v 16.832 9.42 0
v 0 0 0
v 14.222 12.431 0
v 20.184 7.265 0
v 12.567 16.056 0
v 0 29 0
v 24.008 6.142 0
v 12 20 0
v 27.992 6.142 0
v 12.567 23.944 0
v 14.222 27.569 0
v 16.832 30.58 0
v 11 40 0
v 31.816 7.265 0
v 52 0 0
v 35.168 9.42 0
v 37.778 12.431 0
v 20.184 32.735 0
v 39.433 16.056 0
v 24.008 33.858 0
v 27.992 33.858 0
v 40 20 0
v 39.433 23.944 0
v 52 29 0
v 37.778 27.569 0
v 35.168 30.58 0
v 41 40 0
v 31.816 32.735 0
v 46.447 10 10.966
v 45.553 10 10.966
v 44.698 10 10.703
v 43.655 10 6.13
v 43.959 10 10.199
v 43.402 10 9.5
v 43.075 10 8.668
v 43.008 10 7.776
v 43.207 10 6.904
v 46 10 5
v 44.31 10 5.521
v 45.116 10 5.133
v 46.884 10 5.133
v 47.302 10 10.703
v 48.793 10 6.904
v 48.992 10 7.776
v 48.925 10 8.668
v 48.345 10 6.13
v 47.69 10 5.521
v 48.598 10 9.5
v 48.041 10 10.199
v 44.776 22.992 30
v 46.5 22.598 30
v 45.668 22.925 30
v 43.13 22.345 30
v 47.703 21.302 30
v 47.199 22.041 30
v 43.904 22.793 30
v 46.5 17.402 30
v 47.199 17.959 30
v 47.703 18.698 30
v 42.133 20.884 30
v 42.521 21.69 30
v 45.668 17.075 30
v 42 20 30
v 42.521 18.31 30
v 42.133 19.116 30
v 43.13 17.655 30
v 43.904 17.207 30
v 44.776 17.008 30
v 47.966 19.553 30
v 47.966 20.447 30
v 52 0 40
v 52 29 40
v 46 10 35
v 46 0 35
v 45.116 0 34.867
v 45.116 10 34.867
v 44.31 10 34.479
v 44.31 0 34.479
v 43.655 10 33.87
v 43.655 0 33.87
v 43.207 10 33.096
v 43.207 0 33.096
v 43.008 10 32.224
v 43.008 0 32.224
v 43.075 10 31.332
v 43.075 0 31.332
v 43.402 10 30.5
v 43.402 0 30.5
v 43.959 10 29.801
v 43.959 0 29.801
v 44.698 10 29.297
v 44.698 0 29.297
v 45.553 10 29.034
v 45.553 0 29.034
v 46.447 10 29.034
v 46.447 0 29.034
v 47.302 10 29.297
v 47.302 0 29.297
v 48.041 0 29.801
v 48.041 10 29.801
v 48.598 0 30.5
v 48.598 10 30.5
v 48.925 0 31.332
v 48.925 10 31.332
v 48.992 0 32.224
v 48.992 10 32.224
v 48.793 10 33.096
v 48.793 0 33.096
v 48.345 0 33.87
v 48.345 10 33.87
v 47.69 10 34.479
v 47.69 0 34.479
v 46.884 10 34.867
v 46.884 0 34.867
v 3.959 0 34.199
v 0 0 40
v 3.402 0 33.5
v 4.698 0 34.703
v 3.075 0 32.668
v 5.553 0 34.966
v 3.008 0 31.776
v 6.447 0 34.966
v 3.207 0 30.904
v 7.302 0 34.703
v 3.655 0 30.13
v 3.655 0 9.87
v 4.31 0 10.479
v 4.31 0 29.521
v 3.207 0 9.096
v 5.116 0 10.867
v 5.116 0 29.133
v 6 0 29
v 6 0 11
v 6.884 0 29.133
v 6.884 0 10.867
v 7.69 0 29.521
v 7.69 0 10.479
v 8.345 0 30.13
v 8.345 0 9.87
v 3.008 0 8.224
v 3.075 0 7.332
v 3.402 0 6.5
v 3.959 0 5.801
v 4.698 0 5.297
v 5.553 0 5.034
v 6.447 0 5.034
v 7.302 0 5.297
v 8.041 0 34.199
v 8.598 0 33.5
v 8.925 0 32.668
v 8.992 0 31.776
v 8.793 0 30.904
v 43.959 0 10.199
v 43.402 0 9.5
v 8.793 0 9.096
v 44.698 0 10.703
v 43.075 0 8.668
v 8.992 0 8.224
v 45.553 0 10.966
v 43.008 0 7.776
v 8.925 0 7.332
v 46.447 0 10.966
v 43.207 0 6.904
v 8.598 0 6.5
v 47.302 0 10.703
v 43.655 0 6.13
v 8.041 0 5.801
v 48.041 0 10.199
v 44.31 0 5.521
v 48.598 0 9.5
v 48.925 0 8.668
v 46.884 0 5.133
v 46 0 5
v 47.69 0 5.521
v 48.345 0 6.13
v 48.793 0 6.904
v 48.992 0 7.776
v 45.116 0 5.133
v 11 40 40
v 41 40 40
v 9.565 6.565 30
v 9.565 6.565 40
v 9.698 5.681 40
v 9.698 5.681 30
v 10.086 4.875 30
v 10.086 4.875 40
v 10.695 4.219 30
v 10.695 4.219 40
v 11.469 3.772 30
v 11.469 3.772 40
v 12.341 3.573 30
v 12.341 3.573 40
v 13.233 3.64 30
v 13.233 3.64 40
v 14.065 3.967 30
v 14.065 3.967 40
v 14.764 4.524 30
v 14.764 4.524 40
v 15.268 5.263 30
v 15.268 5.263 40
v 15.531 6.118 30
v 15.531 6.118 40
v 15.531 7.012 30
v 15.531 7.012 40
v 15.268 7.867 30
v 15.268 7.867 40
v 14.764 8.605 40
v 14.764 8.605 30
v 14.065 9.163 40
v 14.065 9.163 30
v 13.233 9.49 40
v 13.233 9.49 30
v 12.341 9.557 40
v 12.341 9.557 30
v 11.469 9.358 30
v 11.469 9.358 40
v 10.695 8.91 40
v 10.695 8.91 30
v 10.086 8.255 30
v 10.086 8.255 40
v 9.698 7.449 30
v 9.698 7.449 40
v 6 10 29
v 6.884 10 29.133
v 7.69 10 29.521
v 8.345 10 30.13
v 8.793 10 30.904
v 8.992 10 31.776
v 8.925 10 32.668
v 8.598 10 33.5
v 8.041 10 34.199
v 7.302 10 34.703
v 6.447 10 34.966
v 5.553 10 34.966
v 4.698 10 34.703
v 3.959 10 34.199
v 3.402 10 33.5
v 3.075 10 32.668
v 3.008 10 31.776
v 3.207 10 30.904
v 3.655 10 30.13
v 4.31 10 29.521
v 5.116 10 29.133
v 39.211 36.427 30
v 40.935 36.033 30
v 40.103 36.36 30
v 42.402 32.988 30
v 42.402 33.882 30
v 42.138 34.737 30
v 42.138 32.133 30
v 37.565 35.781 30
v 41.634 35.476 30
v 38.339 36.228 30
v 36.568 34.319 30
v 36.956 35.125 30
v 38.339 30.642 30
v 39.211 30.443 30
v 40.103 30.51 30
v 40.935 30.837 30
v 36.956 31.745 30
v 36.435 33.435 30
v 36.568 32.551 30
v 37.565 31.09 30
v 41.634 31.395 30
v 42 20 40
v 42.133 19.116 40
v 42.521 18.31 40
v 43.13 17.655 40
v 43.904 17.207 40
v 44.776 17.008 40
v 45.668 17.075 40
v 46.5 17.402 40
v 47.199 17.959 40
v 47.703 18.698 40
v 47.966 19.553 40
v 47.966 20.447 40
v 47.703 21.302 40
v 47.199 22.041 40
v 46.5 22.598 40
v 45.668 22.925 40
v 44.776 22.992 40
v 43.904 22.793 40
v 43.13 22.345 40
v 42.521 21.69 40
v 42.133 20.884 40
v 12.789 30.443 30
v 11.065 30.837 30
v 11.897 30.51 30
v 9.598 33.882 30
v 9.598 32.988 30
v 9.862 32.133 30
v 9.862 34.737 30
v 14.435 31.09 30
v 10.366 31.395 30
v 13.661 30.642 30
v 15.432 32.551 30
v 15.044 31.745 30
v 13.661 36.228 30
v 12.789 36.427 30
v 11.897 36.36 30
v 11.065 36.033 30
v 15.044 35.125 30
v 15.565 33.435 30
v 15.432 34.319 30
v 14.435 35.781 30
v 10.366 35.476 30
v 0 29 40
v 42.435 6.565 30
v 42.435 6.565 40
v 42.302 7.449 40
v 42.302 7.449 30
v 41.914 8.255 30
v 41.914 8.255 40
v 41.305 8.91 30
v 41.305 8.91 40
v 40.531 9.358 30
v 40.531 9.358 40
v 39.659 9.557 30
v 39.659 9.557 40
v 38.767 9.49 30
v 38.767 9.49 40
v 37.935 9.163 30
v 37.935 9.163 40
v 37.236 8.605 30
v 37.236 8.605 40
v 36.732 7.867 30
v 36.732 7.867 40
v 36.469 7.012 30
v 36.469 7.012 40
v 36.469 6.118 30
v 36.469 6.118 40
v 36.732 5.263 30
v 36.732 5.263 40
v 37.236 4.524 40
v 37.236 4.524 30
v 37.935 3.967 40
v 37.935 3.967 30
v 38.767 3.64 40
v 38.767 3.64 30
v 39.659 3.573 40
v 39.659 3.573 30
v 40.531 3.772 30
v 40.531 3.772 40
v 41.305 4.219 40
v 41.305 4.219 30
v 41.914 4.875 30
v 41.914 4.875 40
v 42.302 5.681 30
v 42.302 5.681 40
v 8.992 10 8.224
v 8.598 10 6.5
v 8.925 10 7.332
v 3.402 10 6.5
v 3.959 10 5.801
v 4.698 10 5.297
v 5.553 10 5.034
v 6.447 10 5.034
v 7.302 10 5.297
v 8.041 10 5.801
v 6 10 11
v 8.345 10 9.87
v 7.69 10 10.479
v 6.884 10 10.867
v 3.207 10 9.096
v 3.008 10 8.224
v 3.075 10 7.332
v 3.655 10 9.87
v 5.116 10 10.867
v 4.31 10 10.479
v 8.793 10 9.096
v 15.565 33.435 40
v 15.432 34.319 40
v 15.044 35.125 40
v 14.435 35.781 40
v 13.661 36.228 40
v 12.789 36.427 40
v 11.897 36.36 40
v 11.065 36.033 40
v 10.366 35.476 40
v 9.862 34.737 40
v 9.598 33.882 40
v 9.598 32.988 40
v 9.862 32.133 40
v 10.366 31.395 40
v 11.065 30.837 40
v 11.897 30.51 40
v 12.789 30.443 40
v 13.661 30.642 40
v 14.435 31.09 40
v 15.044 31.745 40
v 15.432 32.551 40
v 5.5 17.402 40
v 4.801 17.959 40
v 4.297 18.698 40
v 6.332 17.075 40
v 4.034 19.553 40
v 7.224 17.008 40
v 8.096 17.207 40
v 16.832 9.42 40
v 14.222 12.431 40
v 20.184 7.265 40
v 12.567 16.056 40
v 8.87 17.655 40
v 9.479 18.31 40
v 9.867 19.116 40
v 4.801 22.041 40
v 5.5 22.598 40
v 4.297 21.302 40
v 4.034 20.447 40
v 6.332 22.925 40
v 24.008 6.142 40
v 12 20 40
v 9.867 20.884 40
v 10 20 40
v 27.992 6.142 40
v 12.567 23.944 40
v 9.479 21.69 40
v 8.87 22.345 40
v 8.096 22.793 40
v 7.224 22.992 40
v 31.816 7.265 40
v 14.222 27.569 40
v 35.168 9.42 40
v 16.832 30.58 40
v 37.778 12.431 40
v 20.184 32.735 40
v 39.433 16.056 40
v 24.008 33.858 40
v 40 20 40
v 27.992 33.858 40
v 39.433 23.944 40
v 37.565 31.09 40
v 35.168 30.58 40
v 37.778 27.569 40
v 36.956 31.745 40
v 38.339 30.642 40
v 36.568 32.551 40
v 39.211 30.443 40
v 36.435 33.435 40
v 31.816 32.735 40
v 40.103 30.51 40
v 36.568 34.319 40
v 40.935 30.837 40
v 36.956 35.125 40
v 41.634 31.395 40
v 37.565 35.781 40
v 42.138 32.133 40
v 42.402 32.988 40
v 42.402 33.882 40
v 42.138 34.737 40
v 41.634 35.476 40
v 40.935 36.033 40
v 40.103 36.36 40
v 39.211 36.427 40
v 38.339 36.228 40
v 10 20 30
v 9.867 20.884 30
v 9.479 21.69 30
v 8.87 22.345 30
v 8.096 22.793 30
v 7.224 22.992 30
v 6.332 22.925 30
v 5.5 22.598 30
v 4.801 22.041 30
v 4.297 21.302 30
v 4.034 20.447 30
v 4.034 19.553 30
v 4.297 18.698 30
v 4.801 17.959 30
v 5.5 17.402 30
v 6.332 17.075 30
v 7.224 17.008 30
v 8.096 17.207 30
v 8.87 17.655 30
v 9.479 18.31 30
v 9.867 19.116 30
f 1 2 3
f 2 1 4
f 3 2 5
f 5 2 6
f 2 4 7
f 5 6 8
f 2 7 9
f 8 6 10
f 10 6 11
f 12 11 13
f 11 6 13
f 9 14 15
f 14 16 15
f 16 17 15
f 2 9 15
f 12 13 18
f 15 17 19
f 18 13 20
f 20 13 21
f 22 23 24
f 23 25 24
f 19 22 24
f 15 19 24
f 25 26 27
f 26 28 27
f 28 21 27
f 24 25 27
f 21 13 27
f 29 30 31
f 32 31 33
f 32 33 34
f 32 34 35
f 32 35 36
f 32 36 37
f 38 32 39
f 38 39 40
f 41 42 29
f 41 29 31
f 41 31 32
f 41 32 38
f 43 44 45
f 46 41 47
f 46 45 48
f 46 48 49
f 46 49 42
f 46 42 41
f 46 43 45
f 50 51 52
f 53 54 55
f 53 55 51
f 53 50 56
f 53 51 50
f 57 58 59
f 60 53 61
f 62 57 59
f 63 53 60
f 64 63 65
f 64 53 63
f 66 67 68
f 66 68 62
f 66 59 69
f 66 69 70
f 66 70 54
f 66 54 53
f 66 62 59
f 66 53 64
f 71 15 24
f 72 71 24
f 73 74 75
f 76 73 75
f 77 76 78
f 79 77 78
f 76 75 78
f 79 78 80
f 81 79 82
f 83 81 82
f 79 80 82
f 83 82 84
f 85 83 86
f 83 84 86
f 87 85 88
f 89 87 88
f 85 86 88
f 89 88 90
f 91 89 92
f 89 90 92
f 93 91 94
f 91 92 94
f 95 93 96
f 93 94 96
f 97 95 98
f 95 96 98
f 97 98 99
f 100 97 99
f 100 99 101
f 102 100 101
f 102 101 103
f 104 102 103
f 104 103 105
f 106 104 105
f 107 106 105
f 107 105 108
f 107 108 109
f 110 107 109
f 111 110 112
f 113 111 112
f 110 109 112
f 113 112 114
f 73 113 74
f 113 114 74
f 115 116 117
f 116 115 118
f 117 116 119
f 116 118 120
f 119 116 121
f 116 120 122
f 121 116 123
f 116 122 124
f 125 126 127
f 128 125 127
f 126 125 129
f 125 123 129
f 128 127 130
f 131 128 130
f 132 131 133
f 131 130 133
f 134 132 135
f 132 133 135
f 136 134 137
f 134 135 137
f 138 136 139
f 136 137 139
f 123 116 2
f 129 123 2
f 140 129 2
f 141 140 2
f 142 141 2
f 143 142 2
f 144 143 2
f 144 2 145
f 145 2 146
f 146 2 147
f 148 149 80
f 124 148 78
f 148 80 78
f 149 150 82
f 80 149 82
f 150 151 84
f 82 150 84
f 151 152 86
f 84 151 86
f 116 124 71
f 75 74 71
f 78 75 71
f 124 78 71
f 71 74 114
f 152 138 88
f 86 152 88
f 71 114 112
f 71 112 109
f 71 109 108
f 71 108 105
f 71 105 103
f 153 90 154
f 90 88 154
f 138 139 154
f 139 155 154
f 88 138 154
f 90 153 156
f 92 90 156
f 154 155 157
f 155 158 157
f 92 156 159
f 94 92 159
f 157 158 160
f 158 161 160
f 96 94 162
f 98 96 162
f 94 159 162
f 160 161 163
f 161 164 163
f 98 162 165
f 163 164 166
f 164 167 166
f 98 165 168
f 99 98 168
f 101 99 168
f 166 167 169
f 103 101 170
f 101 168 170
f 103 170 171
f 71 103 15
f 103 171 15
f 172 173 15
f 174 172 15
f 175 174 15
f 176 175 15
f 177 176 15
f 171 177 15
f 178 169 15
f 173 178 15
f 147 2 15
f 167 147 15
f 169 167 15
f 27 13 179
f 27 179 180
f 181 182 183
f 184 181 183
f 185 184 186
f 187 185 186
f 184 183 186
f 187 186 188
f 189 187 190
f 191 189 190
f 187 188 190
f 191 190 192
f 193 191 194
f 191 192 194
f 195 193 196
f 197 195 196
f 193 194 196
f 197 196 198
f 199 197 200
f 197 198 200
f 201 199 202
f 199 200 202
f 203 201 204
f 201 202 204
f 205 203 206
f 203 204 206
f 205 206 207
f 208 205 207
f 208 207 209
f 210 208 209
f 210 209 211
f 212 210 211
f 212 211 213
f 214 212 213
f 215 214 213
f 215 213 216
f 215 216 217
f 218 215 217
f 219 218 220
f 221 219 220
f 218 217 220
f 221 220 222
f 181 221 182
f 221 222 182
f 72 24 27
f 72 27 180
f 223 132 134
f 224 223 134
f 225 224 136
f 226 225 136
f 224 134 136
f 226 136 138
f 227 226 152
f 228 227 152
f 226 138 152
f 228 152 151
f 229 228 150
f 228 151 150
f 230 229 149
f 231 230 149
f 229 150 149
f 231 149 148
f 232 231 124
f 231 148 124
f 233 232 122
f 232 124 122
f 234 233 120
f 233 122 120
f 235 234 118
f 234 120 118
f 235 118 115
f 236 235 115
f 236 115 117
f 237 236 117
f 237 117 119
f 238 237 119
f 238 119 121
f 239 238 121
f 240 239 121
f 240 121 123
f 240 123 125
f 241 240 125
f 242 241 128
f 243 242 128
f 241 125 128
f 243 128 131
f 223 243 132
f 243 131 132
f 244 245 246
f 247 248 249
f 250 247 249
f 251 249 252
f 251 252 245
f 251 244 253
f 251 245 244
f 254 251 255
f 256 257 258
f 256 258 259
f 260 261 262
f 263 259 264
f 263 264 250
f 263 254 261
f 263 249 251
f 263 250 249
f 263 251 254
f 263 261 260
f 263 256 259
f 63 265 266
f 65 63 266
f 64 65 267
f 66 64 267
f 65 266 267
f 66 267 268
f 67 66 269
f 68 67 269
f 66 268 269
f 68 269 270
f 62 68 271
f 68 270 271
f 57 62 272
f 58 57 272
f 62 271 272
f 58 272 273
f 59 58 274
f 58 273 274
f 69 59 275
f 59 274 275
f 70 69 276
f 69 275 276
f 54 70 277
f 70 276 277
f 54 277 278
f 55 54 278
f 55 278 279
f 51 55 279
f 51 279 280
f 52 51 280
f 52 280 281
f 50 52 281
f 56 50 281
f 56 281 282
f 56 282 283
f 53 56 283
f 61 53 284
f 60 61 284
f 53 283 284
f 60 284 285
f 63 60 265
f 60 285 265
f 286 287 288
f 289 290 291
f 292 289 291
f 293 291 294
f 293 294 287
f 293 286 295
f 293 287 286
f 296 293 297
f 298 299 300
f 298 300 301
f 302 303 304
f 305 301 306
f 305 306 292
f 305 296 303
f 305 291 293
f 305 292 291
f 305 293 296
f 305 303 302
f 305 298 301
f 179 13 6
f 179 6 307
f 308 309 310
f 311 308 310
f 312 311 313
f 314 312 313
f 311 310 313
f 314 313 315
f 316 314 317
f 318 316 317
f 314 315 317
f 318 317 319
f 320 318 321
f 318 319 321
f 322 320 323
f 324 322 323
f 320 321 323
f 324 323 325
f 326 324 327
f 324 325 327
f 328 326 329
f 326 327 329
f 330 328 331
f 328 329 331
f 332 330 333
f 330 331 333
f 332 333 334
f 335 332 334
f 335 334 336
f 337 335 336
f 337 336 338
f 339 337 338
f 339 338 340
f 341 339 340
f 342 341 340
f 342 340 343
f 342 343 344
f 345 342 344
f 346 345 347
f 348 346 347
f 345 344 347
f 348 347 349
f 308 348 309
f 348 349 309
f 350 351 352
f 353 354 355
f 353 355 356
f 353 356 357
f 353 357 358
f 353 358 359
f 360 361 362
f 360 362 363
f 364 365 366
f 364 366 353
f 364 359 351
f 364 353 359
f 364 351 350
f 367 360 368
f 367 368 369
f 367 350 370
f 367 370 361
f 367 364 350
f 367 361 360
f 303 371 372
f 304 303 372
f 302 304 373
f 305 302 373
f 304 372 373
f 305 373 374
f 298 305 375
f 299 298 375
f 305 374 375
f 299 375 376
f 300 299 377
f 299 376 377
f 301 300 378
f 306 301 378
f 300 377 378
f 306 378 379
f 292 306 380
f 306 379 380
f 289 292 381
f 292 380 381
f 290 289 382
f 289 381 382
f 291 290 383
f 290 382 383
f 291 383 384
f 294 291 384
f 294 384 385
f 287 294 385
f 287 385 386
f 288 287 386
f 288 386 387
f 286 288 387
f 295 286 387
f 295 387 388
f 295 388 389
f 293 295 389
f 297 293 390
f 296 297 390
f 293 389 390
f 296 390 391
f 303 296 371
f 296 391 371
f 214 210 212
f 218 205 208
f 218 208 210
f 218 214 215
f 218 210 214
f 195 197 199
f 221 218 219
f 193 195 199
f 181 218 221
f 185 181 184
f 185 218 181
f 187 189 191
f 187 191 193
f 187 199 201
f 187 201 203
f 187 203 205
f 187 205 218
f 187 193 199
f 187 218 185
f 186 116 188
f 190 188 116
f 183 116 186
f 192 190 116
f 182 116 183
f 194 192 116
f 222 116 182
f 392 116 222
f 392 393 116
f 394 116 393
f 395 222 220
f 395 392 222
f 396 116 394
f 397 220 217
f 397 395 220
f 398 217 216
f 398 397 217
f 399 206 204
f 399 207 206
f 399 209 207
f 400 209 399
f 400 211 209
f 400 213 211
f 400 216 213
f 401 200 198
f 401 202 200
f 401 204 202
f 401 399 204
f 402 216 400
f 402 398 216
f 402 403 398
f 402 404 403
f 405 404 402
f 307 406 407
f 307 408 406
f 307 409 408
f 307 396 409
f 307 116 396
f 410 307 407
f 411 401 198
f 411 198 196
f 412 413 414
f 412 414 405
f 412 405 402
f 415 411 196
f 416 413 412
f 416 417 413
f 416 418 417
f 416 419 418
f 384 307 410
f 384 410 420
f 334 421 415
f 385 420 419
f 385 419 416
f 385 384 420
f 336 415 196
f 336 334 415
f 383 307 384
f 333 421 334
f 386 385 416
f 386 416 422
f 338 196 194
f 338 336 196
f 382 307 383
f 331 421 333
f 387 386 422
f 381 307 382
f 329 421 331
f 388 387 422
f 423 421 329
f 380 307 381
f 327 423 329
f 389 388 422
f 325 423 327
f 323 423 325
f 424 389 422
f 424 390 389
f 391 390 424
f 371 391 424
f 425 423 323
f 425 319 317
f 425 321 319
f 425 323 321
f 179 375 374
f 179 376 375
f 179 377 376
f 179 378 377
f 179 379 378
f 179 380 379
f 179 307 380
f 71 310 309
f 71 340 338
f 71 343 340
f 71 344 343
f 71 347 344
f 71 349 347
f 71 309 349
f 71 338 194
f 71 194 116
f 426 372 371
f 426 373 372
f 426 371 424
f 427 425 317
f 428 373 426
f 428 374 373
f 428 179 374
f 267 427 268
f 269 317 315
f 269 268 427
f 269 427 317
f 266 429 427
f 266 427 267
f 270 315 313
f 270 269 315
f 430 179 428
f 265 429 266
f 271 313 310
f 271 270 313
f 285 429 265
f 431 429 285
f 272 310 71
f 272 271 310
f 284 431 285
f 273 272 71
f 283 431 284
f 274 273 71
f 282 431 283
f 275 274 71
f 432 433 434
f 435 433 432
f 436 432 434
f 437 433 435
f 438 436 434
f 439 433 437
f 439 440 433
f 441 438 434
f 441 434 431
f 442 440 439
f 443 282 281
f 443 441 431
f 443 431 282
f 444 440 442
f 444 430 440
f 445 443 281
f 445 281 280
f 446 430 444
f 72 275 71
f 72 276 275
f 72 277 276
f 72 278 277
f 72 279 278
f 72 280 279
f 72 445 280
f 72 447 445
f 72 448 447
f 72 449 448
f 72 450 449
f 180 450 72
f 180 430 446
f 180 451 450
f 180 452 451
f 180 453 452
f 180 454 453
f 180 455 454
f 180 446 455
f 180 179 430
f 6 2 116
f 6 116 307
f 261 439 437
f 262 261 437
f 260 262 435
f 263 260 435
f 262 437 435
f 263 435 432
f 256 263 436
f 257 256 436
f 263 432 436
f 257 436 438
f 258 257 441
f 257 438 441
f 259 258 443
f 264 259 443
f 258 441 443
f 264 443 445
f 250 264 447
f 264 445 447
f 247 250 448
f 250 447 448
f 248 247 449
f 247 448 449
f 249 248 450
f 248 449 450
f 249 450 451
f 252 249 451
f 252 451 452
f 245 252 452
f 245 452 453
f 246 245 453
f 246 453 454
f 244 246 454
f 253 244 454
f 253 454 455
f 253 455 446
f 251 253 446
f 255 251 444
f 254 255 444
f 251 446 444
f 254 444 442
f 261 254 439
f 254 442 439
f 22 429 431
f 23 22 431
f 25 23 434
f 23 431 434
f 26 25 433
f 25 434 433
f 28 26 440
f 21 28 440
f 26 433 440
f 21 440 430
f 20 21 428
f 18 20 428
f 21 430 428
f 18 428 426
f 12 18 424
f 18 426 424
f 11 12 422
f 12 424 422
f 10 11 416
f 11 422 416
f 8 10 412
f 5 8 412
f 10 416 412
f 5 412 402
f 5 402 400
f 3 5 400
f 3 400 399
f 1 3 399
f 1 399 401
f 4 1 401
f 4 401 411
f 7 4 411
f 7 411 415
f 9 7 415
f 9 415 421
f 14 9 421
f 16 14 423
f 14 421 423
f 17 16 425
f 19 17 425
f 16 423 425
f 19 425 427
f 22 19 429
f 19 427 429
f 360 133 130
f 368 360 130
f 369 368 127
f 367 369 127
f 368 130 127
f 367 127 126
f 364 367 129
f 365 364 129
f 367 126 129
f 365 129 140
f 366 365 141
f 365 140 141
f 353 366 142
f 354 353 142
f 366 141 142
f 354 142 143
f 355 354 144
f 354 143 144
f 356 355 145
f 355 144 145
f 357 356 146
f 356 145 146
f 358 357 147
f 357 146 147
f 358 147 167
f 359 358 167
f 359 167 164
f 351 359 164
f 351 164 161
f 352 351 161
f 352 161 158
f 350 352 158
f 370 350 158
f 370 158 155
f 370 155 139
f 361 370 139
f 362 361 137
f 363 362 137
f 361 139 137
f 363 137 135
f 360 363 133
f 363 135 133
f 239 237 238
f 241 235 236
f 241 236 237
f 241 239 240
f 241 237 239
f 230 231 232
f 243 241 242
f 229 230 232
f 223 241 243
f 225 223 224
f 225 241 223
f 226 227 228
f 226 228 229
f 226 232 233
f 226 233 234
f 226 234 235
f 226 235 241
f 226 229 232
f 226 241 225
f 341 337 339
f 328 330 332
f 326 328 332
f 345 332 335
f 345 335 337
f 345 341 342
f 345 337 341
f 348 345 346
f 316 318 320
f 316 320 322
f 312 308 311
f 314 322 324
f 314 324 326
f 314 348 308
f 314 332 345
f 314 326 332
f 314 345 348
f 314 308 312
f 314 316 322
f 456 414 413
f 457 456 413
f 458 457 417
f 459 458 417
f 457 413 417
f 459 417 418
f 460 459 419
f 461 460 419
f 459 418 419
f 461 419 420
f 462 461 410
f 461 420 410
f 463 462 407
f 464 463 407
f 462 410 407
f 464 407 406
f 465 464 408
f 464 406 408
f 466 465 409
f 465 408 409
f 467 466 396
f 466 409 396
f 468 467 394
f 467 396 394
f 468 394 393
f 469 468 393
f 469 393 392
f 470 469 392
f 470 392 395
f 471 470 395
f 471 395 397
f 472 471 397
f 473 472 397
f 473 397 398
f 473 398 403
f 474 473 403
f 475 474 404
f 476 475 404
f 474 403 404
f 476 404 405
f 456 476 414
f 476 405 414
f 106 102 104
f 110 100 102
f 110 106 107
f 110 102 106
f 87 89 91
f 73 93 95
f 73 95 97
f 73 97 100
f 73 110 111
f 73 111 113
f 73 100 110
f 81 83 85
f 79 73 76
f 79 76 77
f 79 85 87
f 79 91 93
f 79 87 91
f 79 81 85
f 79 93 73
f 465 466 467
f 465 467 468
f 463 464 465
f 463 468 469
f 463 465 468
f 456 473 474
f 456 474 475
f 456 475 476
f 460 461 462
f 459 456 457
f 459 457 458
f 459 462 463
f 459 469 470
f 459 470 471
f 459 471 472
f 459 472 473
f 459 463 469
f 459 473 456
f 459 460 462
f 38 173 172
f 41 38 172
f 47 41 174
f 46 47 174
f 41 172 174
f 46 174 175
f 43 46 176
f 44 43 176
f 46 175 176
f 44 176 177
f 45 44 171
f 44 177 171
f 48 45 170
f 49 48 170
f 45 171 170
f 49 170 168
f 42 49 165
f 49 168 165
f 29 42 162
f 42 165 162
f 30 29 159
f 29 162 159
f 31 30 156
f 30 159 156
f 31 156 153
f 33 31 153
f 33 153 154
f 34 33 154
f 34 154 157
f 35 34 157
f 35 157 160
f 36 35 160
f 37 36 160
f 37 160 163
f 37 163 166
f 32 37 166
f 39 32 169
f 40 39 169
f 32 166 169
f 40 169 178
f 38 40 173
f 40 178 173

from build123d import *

# Parameters (mm, degrees)
ESQUISSE1_W             = 52
ESQUISSE1_H             = 40
BOSS_EXTRU_1_DEPTH      = 40
ESQUISSE2_R             = 14
ENL_V_MAT_EXTRU_1_DEPTH = 40
ESQUISSE3_R             = 3
ENL_V_MAT_EXTRU_2_DEPTH = 10
CHANFREIN1_SIZE         = 11
ESQUISSE4_R             = 3
ENL_V_MAT_EXTRU_3_DEPTH = 10


with BuildPart() as part:
    # Esquisse1 → Boss.-Extru.1 (new body)
    with BuildSketch(Plane.XY):
        with Locations((26, 20)):
            Rectangle(ESQUISSE1_W, ESQUISSE1_H)
    extrude(amount=BOSS_EXTRU_1_DEPTH)

    # Esquisse2 → Enlèv. mat.-Extru.1 (cut)
    with BuildSketch(Plane.XY.offset(40)):
        with Locations((26, 20)):
            Circle(ESQUISSE2_R)
    extrude(amount=-ENL_V_MAT_EXTRU_1_DEPTH, mode=Mode.SUBTRACT)

    # Esquisse3 → Enlèv. mat.-Extru.2 (cut)
    with BuildSketch(Plane.XY.offset(40)):
        with Locations((7, 20)):
            Circle(ESQUISSE3_R)
        with Locations((12.564971157, 33.435028843)):
            Circle(ESQUISSE3_R)
        with Locations(Location((12.564971157, 6.564971157, 0), (0, 0, 180))):
            Circle(ESQUISSE3_R)
        with Locations((39.435028843, 6.564971157)):
            Circle(ESQUISSE3_R)
        with Locations(Location((39.435028843, 33.435028843, 0), (0, 0, 180))):
            Circle(ESQUISSE3_R)
        with Locations(Location((45, 20, 0), (0, 0, 180))):
            Circle(ESQUISSE3_R)
    extrude(amount=-ENL_V_MAT_EXTRU_2_DEPTH, mode=Mode.SUBTRACT)

    # Chanfrein1
    chanfrein1_edges = [part.edges().sort_by_distance(p)[0] for p in [
        (0, 40, 20),
        (52, 40, 20),
    ]]
    chamfer(chanfrein1_edges, length=CHANFREIN1_SIZE)

    # Esquisse4 → Enlèv. mat.-Extru.3 (cut)
    with BuildSketch(Plane.XZ):
        with Locations(Location((6, 32, 0), (0, 0, 270))):
            Circle(ESQUISSE4_R)
        with Locations(Location((6, 8, 0), (0, 0, 90))):
            Circle(ESQUISSE4_R)
        with Locations(Location((46, 8, 0), (0, 0, 270))):
            Circle(ESQUISSE4_R)
        with Locations(Location((46, 32, 0), (0, 0, 90))):
            Circle(ESQUISSE4_R)
    extrude(amount=-ENL_V_MAT_EXTRU_3_DEPTH, mode=Mode.SUBTRACT)


solid = part.part
